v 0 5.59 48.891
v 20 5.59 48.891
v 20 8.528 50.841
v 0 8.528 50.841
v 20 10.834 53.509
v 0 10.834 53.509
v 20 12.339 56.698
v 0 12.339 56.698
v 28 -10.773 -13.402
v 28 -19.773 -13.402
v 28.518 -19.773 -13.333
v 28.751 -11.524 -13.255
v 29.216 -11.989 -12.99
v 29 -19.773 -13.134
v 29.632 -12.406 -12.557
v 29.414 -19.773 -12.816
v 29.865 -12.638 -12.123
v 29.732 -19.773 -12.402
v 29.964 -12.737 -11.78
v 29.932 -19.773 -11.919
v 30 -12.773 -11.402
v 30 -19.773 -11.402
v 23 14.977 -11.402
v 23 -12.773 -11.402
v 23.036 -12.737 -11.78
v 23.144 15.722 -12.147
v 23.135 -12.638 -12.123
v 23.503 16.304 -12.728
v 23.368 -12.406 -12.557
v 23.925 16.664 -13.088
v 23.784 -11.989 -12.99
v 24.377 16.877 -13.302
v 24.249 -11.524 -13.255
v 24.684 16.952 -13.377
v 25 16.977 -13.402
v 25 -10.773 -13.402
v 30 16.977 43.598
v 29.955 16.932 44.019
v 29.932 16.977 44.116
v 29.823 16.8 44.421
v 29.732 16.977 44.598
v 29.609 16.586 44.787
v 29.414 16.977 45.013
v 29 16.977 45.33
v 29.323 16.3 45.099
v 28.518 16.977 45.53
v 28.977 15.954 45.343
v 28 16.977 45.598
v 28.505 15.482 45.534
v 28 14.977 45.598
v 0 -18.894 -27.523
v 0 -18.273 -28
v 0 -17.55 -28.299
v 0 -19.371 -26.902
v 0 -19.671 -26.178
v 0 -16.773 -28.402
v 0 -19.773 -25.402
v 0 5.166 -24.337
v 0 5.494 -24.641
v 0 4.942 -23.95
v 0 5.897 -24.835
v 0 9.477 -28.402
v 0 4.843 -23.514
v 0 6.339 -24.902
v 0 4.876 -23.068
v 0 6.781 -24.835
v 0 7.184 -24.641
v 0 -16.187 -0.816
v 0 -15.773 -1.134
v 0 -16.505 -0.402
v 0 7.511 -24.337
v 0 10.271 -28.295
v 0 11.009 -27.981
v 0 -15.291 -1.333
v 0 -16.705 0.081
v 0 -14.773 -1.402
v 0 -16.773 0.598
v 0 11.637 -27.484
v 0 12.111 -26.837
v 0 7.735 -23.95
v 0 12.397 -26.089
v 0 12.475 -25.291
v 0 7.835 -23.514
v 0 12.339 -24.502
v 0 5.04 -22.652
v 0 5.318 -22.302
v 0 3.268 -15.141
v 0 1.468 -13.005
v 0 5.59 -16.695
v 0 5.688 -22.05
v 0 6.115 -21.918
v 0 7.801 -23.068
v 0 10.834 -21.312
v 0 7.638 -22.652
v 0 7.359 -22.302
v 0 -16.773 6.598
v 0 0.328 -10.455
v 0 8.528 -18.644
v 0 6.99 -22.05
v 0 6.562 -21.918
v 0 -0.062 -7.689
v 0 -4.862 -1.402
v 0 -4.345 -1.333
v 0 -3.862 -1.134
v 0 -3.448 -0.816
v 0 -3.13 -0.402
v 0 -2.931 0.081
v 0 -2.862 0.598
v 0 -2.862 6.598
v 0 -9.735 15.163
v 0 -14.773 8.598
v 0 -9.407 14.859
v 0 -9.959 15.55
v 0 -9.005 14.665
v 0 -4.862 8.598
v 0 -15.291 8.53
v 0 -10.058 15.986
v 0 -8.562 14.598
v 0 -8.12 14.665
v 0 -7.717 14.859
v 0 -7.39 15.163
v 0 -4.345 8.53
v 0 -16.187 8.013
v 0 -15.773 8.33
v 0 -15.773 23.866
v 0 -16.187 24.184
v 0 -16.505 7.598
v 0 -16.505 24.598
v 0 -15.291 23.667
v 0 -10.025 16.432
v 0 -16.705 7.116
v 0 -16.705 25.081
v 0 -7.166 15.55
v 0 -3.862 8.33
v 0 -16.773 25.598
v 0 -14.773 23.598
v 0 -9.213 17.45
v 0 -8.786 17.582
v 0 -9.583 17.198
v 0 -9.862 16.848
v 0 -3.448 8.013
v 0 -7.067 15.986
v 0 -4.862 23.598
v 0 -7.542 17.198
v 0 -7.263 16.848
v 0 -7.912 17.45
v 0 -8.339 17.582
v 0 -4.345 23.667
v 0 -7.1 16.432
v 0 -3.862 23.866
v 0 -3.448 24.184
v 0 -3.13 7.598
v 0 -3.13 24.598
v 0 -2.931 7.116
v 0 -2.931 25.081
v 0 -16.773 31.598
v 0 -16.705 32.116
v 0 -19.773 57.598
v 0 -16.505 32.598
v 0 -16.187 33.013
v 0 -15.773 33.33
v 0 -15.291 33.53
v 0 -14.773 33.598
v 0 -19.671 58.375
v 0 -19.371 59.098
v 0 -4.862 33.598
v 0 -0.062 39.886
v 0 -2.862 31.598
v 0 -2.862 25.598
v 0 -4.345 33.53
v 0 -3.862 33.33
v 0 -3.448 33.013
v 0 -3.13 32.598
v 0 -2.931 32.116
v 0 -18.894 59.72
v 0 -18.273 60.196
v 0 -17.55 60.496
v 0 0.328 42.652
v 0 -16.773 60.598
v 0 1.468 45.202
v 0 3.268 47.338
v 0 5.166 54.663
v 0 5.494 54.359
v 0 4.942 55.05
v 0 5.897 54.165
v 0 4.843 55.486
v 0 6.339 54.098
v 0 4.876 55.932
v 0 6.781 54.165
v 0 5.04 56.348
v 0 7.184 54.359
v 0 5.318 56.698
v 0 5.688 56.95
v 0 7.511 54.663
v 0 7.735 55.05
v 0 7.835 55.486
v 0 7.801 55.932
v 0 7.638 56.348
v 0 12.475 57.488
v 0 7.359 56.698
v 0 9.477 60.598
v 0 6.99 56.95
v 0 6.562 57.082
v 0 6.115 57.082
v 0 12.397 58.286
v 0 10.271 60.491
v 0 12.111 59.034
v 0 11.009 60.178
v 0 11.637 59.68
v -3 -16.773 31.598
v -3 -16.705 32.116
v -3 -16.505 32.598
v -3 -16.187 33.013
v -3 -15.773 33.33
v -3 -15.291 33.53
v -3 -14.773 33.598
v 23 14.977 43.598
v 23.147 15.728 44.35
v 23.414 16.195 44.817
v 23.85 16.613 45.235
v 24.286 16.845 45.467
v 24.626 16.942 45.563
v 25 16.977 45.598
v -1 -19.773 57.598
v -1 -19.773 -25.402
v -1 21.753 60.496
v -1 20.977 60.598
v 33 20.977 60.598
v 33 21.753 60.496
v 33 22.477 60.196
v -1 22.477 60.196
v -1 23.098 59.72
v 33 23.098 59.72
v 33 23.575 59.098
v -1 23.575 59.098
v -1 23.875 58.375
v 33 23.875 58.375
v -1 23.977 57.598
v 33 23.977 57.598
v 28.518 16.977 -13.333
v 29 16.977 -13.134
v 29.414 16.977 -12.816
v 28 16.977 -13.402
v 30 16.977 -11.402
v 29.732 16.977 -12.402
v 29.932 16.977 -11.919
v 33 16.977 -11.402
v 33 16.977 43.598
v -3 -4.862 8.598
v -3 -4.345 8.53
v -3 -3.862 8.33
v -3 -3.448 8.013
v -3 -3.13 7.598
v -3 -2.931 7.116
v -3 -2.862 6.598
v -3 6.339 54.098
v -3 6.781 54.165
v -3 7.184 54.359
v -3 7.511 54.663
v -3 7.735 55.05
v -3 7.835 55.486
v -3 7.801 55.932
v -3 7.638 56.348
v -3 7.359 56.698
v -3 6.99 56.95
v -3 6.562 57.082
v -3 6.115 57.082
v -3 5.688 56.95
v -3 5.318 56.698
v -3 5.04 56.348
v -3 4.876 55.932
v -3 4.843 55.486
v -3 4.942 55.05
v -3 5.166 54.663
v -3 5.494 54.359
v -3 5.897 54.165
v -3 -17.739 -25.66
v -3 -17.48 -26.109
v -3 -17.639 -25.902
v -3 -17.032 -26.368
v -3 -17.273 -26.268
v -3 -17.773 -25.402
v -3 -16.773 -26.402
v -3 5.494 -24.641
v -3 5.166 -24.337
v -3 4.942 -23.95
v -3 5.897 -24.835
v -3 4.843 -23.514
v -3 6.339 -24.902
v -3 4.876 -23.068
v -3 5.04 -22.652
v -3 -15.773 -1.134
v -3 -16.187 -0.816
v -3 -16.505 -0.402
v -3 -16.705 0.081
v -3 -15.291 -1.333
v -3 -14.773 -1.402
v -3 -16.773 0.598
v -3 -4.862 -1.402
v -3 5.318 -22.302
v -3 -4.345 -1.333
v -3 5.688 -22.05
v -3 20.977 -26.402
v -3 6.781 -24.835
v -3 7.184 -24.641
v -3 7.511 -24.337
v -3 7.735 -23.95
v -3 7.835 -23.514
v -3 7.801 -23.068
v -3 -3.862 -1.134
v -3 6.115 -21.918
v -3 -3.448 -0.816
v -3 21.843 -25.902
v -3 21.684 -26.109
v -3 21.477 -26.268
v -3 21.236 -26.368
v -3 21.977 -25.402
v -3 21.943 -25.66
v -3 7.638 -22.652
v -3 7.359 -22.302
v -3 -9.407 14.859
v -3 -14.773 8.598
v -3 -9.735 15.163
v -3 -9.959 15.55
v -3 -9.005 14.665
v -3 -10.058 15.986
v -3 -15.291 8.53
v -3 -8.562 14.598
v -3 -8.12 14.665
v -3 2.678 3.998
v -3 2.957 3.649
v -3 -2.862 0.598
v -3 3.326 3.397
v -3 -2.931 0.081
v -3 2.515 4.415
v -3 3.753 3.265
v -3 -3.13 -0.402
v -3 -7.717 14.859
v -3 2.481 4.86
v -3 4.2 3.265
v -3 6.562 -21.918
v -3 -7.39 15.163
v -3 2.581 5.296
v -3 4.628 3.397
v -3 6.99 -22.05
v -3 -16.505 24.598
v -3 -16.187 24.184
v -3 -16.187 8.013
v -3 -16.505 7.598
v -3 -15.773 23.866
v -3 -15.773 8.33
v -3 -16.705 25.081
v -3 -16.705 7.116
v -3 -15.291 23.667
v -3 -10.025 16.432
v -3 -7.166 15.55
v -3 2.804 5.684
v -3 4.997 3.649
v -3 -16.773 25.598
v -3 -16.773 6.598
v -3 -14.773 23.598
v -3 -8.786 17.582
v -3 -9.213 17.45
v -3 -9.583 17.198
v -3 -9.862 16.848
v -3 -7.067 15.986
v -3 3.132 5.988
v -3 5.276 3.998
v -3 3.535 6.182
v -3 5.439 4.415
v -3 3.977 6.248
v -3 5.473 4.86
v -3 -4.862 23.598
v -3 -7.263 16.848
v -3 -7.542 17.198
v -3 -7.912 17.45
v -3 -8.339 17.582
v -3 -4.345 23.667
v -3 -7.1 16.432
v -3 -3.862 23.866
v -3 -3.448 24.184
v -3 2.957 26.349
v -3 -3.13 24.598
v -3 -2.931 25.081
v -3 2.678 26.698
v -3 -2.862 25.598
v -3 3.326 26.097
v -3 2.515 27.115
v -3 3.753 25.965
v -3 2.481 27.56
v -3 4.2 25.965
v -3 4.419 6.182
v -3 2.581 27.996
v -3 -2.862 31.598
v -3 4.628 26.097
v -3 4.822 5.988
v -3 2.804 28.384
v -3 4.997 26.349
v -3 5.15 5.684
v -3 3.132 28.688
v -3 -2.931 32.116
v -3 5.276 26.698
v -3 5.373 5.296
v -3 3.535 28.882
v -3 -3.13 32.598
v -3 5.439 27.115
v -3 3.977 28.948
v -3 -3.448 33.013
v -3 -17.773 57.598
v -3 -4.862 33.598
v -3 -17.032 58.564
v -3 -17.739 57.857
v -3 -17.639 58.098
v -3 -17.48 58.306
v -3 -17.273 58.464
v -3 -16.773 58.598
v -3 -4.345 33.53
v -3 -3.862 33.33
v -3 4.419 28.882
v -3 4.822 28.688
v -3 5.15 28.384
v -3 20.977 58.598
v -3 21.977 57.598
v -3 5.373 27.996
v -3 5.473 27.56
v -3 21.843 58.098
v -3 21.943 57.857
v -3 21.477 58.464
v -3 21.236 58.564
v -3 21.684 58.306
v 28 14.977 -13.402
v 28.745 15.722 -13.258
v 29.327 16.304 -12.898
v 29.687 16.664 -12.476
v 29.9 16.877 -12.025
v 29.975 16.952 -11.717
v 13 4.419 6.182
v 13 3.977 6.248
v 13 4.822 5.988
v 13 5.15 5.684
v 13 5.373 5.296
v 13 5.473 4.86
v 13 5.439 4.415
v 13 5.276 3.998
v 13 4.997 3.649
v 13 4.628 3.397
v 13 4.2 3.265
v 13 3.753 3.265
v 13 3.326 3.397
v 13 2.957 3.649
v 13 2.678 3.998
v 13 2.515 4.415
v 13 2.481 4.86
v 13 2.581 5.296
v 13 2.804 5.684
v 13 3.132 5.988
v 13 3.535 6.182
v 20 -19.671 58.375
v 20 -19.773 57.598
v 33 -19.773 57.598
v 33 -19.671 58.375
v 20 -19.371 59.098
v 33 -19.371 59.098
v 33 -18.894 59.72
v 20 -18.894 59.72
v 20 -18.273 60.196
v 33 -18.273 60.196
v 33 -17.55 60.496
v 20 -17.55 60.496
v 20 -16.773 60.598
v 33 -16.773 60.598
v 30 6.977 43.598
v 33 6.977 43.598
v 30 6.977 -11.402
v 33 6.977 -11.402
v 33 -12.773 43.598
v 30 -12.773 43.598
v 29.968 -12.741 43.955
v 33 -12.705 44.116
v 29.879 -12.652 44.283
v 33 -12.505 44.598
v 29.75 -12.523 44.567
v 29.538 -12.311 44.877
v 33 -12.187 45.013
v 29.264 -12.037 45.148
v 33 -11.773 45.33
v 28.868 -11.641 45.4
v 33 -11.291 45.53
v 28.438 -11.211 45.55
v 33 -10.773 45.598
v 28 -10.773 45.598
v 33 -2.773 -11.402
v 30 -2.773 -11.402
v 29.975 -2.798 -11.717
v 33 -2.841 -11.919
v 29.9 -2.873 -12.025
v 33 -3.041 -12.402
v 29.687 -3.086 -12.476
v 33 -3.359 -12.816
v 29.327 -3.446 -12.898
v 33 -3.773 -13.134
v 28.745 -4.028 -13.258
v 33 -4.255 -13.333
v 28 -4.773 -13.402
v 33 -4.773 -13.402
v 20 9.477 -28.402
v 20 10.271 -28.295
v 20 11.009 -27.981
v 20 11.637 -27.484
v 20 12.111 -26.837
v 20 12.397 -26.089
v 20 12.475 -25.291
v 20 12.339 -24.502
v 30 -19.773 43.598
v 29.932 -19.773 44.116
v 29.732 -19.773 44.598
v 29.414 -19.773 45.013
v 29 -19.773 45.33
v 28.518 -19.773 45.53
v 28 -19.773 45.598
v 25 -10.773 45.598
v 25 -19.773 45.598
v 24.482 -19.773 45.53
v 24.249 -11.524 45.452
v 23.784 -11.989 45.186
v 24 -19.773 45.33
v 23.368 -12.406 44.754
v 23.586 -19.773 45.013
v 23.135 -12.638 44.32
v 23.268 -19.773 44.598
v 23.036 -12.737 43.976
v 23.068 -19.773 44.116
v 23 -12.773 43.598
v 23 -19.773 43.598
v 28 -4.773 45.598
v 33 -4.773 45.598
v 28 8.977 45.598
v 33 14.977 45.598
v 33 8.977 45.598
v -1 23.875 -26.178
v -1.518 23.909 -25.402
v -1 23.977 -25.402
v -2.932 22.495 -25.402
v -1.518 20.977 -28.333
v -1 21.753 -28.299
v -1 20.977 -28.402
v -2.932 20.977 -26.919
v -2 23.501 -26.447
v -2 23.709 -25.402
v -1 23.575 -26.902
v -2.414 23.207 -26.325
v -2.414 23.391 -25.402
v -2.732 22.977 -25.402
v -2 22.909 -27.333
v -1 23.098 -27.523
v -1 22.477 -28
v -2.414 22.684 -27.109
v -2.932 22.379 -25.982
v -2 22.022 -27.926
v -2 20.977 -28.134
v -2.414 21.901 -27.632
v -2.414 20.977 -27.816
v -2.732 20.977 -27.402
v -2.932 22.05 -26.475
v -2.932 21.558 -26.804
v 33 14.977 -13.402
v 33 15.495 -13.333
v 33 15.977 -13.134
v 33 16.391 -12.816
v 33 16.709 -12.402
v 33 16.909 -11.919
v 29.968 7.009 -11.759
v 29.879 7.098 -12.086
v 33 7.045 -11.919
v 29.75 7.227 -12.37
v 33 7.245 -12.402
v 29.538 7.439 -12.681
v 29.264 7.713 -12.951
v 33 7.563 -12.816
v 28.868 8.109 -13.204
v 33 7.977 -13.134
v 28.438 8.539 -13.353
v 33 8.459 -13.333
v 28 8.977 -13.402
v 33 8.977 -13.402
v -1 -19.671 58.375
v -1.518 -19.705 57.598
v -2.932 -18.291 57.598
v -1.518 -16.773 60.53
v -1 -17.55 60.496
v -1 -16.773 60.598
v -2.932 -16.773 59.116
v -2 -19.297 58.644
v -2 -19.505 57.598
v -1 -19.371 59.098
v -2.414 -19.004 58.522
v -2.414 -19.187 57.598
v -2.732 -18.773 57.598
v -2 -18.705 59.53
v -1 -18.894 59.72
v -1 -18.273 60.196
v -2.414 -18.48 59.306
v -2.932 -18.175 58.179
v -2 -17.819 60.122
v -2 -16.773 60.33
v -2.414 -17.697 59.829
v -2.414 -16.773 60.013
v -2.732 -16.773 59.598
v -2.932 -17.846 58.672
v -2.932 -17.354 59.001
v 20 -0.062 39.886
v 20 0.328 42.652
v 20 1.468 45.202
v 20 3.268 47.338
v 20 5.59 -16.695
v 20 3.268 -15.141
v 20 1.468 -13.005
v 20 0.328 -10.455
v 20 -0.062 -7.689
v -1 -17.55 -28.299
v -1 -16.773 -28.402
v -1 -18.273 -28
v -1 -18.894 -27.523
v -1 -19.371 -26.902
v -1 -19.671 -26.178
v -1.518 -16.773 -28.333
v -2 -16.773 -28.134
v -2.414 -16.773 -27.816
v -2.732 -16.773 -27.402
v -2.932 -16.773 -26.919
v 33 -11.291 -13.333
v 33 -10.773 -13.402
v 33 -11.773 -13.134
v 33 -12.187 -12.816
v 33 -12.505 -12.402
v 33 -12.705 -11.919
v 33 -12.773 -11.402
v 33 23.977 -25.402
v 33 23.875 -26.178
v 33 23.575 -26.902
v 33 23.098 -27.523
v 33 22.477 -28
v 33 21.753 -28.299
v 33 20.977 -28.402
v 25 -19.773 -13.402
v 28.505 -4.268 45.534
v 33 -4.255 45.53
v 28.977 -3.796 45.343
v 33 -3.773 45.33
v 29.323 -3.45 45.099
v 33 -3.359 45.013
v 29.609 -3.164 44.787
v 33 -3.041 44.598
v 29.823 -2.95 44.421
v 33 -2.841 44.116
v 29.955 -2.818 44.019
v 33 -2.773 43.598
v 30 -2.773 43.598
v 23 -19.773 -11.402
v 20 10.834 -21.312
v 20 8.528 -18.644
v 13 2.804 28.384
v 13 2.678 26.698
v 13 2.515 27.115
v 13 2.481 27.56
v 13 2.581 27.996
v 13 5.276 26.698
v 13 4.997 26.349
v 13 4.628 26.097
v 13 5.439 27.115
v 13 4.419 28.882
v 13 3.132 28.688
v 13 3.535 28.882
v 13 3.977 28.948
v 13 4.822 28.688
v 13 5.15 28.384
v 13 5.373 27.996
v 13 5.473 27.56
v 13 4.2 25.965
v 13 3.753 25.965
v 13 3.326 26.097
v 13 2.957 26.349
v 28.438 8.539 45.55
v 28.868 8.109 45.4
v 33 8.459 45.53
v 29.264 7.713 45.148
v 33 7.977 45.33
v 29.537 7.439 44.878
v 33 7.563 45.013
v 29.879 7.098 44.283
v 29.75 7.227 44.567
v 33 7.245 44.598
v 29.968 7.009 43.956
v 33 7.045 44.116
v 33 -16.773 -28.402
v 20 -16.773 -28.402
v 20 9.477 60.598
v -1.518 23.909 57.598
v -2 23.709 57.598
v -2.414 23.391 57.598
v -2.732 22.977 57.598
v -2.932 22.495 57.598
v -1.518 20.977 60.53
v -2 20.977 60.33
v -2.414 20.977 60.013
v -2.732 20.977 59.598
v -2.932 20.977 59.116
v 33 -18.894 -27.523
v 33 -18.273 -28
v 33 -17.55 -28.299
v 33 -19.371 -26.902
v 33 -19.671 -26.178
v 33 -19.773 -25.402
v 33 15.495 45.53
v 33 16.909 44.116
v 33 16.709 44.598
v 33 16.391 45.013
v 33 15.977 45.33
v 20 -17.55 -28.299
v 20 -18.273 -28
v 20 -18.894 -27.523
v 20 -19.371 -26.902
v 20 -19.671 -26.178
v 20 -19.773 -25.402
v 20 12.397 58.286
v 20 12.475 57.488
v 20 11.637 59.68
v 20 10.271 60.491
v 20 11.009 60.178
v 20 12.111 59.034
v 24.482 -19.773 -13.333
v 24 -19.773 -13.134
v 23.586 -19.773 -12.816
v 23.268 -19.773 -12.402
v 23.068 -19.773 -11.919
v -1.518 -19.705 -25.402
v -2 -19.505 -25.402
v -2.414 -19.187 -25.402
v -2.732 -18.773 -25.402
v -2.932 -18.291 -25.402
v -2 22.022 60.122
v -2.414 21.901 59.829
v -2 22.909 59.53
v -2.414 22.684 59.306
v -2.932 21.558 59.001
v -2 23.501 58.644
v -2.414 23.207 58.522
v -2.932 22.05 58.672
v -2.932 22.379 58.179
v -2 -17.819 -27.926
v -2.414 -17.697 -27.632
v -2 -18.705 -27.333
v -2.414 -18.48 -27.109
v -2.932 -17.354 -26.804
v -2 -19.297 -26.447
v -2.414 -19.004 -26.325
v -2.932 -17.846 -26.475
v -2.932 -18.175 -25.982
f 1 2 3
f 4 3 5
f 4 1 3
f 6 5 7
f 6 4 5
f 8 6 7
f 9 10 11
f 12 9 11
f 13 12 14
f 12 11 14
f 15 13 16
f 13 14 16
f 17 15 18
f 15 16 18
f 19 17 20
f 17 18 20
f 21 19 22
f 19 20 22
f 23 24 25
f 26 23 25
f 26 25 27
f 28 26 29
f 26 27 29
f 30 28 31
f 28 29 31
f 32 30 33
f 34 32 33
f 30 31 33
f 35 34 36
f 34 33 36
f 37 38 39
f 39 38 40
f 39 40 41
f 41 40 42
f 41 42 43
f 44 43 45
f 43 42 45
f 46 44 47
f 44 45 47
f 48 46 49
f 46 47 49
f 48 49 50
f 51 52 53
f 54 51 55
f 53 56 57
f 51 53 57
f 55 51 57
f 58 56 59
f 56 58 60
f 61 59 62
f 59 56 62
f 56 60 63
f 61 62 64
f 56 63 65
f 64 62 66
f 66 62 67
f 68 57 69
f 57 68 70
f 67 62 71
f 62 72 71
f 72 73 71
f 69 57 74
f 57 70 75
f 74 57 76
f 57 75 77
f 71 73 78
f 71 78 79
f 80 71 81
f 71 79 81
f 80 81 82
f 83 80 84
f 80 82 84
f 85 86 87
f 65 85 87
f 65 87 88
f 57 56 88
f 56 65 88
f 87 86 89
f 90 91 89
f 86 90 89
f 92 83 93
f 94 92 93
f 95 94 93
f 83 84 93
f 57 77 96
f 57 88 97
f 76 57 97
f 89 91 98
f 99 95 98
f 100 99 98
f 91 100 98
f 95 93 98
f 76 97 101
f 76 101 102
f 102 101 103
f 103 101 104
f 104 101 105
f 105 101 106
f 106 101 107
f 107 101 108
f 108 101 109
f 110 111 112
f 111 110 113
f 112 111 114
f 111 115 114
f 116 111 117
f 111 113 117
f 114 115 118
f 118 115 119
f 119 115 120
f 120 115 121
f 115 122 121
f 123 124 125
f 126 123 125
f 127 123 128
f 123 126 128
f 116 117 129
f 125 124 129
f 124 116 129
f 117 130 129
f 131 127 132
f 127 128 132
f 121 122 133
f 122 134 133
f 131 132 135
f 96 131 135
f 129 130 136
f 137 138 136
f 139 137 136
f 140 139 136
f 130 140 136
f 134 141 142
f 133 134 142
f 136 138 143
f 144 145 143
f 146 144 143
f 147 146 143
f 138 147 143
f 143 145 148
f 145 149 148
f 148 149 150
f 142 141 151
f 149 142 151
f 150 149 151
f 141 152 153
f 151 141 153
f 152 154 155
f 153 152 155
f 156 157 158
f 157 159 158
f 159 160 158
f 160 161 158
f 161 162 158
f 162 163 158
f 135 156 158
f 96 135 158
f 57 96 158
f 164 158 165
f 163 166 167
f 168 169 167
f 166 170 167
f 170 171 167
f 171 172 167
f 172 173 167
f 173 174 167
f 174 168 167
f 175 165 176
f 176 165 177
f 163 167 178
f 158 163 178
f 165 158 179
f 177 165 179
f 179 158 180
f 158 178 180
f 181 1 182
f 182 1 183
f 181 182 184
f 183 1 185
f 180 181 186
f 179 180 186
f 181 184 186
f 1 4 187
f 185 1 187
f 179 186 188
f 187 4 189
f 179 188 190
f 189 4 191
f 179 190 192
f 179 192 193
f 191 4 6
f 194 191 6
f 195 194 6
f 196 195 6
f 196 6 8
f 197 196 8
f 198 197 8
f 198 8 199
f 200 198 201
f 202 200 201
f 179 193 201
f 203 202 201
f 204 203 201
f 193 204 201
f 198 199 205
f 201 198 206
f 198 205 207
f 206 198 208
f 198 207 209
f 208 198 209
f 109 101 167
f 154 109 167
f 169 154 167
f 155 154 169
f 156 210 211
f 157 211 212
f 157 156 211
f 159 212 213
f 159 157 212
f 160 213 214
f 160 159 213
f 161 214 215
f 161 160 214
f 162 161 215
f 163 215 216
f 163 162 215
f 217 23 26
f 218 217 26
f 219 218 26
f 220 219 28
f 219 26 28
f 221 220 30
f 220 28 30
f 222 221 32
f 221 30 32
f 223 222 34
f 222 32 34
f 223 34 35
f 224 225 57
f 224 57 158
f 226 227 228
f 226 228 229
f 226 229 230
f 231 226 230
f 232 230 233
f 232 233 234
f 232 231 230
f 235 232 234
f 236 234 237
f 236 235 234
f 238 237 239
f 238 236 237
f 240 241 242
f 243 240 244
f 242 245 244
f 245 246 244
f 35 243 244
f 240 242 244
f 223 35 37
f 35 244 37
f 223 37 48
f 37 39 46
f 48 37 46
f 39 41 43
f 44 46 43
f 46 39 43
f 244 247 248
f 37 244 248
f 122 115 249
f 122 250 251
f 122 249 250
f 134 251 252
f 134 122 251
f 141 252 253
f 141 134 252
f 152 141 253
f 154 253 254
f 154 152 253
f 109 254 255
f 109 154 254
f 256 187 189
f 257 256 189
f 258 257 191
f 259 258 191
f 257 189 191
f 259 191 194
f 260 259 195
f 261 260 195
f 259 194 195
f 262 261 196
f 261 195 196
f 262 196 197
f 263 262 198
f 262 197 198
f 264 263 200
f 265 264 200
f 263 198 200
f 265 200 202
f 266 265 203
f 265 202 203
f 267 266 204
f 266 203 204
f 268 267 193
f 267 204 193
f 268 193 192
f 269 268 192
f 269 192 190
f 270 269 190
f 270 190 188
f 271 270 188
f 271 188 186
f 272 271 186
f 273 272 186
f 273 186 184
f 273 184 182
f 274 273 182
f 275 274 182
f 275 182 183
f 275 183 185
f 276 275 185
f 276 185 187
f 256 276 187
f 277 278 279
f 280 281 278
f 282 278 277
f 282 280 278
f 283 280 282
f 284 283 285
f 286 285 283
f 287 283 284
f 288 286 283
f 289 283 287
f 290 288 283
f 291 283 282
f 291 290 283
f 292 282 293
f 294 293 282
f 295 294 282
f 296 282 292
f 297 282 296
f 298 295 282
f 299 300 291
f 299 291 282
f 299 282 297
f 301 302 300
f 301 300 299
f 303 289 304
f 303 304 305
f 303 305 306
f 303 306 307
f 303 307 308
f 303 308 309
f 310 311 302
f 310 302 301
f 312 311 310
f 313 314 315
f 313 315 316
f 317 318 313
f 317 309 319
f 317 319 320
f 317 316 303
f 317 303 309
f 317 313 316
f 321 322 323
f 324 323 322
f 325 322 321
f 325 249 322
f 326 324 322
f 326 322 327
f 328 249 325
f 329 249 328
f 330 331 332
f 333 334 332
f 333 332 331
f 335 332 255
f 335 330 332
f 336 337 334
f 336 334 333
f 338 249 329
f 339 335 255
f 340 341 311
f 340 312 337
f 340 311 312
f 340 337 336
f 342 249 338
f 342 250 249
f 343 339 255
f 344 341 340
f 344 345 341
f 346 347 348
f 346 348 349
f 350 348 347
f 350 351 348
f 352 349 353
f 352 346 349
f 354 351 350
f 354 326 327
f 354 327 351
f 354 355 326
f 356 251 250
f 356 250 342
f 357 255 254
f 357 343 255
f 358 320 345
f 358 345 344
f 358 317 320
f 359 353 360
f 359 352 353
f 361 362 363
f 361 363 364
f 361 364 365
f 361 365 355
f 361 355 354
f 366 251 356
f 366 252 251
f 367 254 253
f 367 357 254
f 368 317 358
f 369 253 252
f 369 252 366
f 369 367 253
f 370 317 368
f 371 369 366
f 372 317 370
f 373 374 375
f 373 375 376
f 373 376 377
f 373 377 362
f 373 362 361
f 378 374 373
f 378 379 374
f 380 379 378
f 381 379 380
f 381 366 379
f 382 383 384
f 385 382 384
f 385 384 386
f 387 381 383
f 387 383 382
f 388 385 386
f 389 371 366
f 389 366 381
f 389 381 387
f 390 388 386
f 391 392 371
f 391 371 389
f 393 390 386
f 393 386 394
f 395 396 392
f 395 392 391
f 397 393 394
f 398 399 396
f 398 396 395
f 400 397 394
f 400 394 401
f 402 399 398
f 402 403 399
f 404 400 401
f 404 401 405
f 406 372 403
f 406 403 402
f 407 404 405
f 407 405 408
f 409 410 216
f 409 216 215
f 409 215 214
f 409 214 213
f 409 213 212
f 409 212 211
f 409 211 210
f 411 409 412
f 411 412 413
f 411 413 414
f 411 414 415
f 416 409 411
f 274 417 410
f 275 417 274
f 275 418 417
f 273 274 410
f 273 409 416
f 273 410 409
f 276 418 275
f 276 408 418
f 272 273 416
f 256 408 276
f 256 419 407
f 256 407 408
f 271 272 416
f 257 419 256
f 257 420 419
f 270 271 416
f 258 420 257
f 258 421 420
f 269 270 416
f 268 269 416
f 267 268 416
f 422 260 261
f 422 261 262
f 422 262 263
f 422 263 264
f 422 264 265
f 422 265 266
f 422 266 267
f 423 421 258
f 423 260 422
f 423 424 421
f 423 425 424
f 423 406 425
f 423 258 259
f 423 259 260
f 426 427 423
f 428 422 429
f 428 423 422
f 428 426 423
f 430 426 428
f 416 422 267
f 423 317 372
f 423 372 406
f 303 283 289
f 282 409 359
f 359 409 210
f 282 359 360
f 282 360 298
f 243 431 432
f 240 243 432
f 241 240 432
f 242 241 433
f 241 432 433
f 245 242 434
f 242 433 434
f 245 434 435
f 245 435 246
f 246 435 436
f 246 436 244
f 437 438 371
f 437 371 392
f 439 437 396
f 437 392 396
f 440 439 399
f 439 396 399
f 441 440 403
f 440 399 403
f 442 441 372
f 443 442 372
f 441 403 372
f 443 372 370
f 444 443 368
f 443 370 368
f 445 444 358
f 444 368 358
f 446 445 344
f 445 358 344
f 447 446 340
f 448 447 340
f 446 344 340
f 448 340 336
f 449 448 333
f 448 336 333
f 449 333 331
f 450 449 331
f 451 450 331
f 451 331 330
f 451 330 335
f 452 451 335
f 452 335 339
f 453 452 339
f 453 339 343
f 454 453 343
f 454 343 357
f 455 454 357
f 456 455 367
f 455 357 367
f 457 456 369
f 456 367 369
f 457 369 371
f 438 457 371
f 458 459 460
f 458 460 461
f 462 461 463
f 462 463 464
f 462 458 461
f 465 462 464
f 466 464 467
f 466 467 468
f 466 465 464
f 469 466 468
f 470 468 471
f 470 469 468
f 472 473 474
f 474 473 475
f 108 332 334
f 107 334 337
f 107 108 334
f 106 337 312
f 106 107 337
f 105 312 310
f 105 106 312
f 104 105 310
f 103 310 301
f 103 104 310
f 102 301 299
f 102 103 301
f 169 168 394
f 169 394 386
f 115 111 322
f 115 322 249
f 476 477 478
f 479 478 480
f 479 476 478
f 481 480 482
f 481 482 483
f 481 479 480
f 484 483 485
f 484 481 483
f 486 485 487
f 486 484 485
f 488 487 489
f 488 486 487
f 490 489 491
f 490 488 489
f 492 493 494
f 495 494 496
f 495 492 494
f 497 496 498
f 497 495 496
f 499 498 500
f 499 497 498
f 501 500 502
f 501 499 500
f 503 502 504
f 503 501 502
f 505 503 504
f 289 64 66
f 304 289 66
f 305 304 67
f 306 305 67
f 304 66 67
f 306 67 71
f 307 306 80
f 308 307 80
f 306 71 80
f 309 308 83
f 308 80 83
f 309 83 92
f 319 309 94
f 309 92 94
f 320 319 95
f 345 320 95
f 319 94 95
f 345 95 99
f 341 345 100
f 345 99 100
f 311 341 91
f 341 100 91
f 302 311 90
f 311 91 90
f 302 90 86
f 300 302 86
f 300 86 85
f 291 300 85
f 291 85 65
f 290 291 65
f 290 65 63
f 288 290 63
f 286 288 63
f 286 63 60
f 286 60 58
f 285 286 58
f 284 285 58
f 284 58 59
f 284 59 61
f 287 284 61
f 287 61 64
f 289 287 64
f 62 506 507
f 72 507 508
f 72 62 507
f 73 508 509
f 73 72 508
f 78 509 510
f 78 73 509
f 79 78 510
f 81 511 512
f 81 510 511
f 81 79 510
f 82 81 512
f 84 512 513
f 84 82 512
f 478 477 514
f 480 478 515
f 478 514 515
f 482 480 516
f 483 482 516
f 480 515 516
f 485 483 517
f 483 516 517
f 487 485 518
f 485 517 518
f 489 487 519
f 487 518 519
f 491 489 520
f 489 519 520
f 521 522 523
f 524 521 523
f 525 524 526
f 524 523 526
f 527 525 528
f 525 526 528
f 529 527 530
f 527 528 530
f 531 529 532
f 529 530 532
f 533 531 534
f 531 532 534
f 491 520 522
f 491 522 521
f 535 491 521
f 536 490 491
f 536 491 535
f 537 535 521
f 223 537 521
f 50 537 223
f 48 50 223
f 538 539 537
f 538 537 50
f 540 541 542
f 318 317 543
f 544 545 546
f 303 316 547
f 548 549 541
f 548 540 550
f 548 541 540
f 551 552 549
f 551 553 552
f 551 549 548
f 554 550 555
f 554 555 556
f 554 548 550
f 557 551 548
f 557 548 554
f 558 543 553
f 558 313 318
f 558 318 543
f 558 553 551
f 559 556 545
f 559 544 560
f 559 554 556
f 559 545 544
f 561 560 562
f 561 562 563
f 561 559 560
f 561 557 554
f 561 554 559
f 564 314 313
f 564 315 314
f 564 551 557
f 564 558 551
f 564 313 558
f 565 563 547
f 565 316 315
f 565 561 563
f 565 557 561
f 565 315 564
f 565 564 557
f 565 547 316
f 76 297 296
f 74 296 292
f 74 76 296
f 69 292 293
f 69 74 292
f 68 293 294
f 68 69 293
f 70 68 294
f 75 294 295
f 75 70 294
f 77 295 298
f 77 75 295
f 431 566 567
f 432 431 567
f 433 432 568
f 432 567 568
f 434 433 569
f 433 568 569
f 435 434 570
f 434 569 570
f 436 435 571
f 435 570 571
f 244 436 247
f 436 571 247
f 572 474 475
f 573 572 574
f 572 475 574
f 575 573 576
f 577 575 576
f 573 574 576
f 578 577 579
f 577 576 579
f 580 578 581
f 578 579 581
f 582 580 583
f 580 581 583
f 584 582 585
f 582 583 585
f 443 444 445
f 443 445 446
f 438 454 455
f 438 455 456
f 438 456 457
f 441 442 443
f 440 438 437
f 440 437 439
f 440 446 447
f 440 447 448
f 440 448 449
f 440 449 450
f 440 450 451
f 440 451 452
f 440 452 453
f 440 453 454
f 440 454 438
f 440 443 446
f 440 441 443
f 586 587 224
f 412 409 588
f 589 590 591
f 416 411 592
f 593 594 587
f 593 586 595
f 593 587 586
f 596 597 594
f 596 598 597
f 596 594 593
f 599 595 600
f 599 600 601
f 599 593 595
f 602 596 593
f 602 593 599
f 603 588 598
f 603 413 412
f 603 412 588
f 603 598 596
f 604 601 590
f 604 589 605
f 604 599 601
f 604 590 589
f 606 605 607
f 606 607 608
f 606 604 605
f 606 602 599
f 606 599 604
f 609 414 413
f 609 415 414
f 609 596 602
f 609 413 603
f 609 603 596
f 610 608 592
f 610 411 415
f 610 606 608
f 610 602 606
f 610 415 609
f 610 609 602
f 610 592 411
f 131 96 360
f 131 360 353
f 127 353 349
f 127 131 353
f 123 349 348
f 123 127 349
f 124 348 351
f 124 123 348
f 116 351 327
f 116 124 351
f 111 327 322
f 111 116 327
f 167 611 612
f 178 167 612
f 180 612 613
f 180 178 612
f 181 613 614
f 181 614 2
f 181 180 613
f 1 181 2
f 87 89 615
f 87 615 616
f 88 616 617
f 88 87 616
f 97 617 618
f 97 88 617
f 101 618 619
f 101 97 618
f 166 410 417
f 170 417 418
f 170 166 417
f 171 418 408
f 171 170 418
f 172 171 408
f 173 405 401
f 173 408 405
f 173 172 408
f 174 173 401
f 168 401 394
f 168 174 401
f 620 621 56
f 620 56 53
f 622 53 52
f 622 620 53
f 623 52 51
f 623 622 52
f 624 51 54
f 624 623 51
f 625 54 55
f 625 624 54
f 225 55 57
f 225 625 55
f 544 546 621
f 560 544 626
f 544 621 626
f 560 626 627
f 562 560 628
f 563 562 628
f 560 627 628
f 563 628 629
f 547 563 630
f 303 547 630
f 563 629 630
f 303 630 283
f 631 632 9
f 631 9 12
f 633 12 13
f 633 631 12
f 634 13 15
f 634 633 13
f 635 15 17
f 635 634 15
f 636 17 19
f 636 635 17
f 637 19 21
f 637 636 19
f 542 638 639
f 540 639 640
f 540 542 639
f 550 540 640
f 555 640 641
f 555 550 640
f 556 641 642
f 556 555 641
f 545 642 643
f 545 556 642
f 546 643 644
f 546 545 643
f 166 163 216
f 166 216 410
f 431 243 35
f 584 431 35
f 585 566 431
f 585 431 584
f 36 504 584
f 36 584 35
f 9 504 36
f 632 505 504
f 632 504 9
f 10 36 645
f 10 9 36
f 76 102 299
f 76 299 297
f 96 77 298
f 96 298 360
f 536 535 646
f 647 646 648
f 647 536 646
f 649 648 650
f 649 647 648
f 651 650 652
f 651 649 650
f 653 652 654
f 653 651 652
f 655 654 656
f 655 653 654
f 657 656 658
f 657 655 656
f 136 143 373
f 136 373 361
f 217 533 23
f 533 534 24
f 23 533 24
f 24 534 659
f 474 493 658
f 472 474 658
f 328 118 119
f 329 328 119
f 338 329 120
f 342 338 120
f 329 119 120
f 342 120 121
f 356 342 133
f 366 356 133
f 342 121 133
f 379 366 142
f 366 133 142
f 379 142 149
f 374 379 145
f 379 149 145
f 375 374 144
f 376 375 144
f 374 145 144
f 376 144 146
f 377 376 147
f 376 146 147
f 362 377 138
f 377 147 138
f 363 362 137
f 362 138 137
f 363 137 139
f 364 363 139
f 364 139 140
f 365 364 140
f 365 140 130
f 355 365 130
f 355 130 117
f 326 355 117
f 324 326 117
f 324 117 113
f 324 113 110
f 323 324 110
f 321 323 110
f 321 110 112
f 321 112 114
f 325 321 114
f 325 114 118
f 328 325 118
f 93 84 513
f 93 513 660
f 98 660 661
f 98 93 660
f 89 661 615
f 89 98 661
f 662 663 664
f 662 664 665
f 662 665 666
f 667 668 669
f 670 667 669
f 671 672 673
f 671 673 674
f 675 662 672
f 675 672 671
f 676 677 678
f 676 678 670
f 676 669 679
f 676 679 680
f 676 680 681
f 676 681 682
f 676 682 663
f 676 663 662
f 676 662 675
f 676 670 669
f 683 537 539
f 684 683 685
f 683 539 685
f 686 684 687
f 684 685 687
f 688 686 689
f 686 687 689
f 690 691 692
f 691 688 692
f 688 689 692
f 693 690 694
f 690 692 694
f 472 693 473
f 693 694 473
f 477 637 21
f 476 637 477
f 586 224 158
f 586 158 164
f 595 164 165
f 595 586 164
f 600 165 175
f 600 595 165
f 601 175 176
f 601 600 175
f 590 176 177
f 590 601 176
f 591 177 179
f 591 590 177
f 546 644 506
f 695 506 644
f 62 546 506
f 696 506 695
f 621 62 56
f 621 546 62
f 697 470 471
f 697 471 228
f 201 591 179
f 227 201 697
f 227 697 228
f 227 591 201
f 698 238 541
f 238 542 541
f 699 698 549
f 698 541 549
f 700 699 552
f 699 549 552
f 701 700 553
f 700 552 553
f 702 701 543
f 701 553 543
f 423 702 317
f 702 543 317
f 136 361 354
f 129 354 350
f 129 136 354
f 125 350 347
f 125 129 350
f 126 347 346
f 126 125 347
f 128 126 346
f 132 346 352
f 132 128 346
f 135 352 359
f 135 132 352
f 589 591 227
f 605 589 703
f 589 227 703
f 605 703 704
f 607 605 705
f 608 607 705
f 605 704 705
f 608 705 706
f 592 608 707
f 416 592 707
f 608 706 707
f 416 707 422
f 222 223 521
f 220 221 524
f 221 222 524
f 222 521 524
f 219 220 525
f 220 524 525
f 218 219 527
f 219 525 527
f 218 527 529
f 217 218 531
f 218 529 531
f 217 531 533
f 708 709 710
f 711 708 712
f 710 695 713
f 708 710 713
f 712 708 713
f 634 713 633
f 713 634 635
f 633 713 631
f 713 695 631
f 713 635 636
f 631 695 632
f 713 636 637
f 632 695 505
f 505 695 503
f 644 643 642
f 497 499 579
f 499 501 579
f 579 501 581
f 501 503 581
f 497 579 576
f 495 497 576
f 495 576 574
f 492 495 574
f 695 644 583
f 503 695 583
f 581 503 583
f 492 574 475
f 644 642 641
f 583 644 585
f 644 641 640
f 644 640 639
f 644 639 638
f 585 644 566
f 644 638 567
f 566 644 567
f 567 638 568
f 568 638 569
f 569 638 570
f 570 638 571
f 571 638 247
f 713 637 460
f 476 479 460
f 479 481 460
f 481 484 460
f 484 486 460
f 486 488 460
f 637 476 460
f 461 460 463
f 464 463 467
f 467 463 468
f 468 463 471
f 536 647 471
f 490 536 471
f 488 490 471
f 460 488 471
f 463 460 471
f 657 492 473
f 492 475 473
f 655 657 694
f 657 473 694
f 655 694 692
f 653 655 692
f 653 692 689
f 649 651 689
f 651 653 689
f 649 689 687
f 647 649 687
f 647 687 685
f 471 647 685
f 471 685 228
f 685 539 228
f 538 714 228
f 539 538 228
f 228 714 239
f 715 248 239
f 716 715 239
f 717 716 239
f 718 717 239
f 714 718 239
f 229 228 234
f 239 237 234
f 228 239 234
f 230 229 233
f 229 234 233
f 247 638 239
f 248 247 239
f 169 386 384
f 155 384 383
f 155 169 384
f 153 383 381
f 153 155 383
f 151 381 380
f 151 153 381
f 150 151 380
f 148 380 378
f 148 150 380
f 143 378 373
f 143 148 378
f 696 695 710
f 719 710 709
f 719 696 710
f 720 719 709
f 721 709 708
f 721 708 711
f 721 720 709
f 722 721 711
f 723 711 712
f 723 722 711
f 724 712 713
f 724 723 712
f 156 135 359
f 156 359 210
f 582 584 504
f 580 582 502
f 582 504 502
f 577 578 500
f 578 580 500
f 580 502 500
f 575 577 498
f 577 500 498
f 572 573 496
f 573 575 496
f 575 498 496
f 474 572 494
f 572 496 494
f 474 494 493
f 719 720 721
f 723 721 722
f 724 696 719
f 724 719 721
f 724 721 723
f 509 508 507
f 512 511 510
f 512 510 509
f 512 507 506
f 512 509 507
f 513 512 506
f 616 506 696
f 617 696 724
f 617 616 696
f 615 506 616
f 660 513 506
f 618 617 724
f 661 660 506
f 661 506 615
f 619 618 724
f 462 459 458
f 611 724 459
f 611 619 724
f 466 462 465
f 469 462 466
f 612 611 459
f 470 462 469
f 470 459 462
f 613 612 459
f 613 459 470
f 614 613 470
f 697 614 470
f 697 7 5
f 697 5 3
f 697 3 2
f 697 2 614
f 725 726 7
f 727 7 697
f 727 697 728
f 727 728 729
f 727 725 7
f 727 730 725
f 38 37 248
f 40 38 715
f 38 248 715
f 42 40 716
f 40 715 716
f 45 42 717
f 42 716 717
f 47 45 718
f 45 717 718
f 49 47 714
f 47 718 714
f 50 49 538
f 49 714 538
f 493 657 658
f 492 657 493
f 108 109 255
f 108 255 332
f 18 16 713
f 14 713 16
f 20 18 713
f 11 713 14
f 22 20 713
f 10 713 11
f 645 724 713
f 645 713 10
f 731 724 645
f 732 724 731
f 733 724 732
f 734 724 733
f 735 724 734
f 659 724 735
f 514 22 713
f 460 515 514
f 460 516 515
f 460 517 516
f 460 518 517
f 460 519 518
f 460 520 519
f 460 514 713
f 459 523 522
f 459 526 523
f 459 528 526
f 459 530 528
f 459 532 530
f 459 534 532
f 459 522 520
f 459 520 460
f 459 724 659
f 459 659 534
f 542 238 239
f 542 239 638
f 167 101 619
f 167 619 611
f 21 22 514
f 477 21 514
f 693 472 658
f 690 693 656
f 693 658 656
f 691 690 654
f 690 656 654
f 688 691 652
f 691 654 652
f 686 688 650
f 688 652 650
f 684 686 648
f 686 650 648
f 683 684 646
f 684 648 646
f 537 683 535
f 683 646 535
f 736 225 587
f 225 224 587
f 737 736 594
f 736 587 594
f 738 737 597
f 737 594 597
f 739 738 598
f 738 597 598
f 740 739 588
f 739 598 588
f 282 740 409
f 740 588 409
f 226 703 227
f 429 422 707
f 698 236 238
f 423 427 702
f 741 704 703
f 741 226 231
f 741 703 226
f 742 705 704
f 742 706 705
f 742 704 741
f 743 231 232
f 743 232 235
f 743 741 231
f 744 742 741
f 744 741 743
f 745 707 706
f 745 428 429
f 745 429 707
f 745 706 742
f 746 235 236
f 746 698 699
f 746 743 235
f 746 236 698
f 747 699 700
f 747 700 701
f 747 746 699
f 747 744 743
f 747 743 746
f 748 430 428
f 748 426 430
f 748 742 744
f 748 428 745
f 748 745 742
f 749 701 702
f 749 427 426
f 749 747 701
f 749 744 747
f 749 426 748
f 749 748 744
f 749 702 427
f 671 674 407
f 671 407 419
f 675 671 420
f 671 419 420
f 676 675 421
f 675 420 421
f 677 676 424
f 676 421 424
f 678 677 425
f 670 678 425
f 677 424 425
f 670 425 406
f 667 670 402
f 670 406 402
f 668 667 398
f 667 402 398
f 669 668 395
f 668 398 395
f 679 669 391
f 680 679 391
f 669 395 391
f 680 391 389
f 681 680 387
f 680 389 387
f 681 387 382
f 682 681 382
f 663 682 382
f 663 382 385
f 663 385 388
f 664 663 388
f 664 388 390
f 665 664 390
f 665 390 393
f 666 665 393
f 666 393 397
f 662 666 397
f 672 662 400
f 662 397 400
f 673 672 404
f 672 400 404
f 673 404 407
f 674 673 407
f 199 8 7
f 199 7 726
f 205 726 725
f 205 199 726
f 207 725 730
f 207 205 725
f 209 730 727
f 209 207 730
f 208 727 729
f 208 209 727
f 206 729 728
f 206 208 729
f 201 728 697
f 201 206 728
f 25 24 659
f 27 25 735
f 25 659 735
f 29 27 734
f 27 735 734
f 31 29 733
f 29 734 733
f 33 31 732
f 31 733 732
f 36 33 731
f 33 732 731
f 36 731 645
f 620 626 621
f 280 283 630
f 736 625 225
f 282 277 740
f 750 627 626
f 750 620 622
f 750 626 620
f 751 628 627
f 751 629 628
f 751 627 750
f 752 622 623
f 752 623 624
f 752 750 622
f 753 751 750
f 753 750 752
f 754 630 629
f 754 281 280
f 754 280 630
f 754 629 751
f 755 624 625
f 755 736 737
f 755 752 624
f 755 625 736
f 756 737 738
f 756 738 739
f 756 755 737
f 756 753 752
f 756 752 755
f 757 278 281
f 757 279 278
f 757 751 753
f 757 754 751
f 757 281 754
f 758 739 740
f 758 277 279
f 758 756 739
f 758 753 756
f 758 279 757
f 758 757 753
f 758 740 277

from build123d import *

# Parameters (mm, degrees)
RESSALTO_EXTRUS_O2_DEPTH      = 30
RESSALTO_EXTRUS_O3_START      = 3
RESSALTO_EXTRUS_O3_DEPTH      = 3
RESSALTO_EXTRUS_O4_DEPTH      = 3
RESSALTO_EXTRUS_O4_DEPTH_BACK = 10
CORTE_EXTRUS_O1_DEPTH         = 10
CORTE_EXTRUS_O2_REACH         = 83.702
FILETE1_START                 = -19.773073923
FILETE1_DEPTH                 = 36.75
FILETE1_START_2               = -13.40159992
FILETE1_2_DEPTH               = 59
ESBO_O10_R                    = 1.5
CORTE_EXTRUS_O3_DEPTH         = 10
CORTE_EXTRUS_O4_DEPTH         = 10
FILETE2_R                     = 2
ESBO_O13_R                    = 1.5
CORTE_EXTRUS_O5_DEPTH         = 16


with BuildPart() as part:
    # Esboço2 → Ressalto-extrusão2 (new body)
    with BuildSketch(Plane(origin=(0, 0, 0), x_dir=(0, 0, -1), z_dir=(1, 0, 0))):
        with BuildLine():
            Line((2.90159992, -0.062465938), (-35.09840008, -0.062465938))
            Line((-35.09840008, -0.062465938), (-39.886084903, -0.062465938))
            ThreePointArc((-39.886084903, -0.062465938), (-45.202180234, 1.467638524), (-48.891439328, 5.589707975))
            ThreePointArc((-48.891439328, 5.589707975), (-52.096536948, 9.772081499), (-56.69840008, 12.338743681))
            ThreePointArc((-56.69840008, 12.338743681), (-59.373224015, 11.895603401), (-60.59840008, 9.476926077))
            Line((-60.59840008, 9.476926077), (-60.59840008, 20.976926077))
            ThreePointArc((-60.59840008, 20.976926077), (-59.719720424, 23.09824642), (-57.59840008, 23.976926077))
            Line((-57.59840008, 23.976926077), (25.40159992, 23.976926077))
            ThreePointArc((25.40159992, 23.976926077), (27.522920263, 23.09824642), (28.40159992, 20.976926077))
            Line((28.40159992, 20.976926077), (28.40159992, 9.476926077))
            ThreePointArc((28.40159992, 9.476926077), (27.176423855, 11.895603401), (24.50159992, 12.338743681))
            ThreePointArc((24.50159992, 12.338743681), (19.899736788, 9.772081499), (16.694639168, 5.589707975))
            ThreePointArc((16.694639168, 5.589707975), (13.005380073, 1.467638524), (7.689284743, -0.062465938))
            Line((7.689284743, -0.062465938), (2.90159992, -0.062465938))
        make_face()
    extrude(amount=RESSALTO_EXTRUS_O2_DEPTH)

    # Esboço3 → Ressalto-extrusão3 (add)
    with BuildSketch(Plane.ZY.offset(RESSALTO_EXTRUS_O3_START)):
        with BuildLine():
            Line((60.59840008, 15.226926077), (60.59840008, 20.976926077))
            ThreePointArc((60.59840008, 20.976926077), (59.719720424, 23.09824642), (57.59840008, 23.976926077))
            Line((57.59840008, 23.976926077), (16.09840008, 23.976926077))
            Line((16.09840008, 23.976926077), (-25.40159992, 23.976926077))
            ThreePointArc((-25.40159992, 23.976926077), (-27.522920263, 23.09824642), (-28.40159992, 20.976926077))
            Line((-28.40159992, 20.976926077), (-28.40159992, 15.226926077))
            Line((-28.40159992, 15.226926077), (-28.40159992, -16.773073923))
            ThreePointArc((-28.40159992, -16.773073923), (-27.522920263, -18.894394267), (-25.40159992, -19.773073923))
            Line((-25.40159992, -19.773073923), (57.59840008, -19.773073923))
            ThreePointArc((57.59840008, -19.773073923), (59.719720424, -18.894394267), (60.59840008, -16.773073923))
            Line((60.59840008, -16.773073923), (60.59840008, 15.226926077))
        make_face()
    extrude(amount=-RESSALTO_EXTRUS_O3_DEPTH)

    # Esboço4 → Ressalto-extrusão4 (add, two sides: drawn at the far end of the back side and taken through both)
    with BuildSketch(Plane(origin=(30, 0, 0), x_dir=(0, 0, -1), z_dir=(1, 0, 0)).offset(-RESSALTO_EXTRUS_O4_DEPTH_BACK)):
        with BuildLine():
            Line((-16.09840008, 23.976926077), (25.40159992, 23.976926077))
            ThreePointArc((25.40159992, 23.976926077), (27.522920263, 23.09824642), (28.40159992, 20.976926077))
            Line((28.40159992, 20.976926077), (28.40159992, 15.226926077))
            Line((28.40159992, 15.226926077), (28.40159992, -16.773073923))
            ThreePointArc((28.40159992, -16.773073923), (27.522920263, -18.894394267), (25.40159992, -19.773073923))
            Line((25.40159992, -19.773073923), (-57.59840008, -19.773073923))
            ThreePointArc((-57.59840008, -19.773073923), (-59.719720424, -18.894394267), (-60.59840008, -16.773073923))
            Line((-60.59840008, -16.773073923), (-60.59840008, 15.226926077))
            Line((-60.59840008, 15.226926077), (-60.59840008, 20.976926077))
            ThreePointArc((-60.59840008, 20.976926077), (-59.719720424, 23.09824642), (-57.59840008, 23.976926077))
            Line((-57.59840008, 23.976926077), (-16.09840008, 23.976926077))
        make_face()
    extrude(amount=RESSALTO_EXTRUS_O4_DEPTH + RESSALTO_EXTRUS_O4_DEPTH_BACK)

    # Esboço8 → Corte-extrusão1 (cut)
    with BuildSketch(Plane(origin=(33, 0, 0), x_dir=(0, 0, -1), z_dir=(1, 0, 0))):
        with BuildLine():
            Line((-43.59840008, -2.773073923), (11.40159992, -2.773073923))
            ThreePointArc((11.40159992, -2.773073923), (12.815813482, -3.358860361), (13.40159992, -4.773073923))
            Line((13.40159992, -4.773073923), (13.40159992, -10.773073923))
            ThreePointArc((13.40159992, -10.773073923), (12.815813482, -12.187287486), (11.40159992, -12.773073923))
            Line((11.40159992, -12.773073923), (-43.59840008, -12.773073923))
            ThreePointArc((-43.59840008, -12.773073923), (-45.012613643, -12.187287486), (-45.59840008, -10.773073923))
            Line((-45.59840008, -10.773073923), (-45.59840008, -4.773073923))
            ThreePointArc((-45.59840008, -4.773073923), (-45.012613643, -3.358860361), (-43.59840008, -2.773073923))
        make_face()
        with BuildLine():
            Line((-43.59840008, 6.976926077), (11.40159992, 6.976926077))
            ThreePointArc((11.40159992, 6.976926077), (12.815813482, 7.562712514), (13.40159992, 8.976926077))
            Line((13.40159992, 8.976926077), (13.40159992, 14.976926077))
            ThreePointArc((13.40159992, 14.976926077), (12.815813482, 16.391139639), (11.40159992, 16.976926077))
            Line((11.40159992, 16.976926077), (-43.59840008, 16.976926077))
            ThreePointArc((-43.59840008, 16.976926077), (-45.012613643, 16.391139639), (-45.59840008, 14.976926077))
            Line((-45.59840008, 14.976926077), (-45.59840008, 8.976926077))
            ThreePointArc((-45.59840008, 8.976926077), (-45.012613643, 7.562712514), (-43.59840008, 6.976926077))
        make_face()
    extrude(amount=-CORTE_EXTRUS_O1_DEPTH, mode=Mode.SUBTRACT)

    # Corte-extrusão2: up to this face of the body (flat: up to its plane)
    corte_extrus_o2_end = Plane(part.part.faces().sort_by_distance((28, 16.976926077, 16.09840008))[0])
    # Esboço9 → Corte-extrusão2 (cut, up to the picked face)
    with BuildSketch(Plane(origin=(0, -19.773073923, 0), x_dir=(-1, 0, 0), z_dir=(0, -1, 0)), mode=Mode.PRIVATE) as corte_extrus_o2_sk1:
        with BuildLine():
            Line((-25, 13.40159992), (-28, 13.40159992))
            ThreePointArc((-28, 13.40159992), (-29.414213562, 12.815813482), (-30, 11.40159992))
            Line((-30, 11.40159992), (-30, -43.59840008))
            ThreePointArc((-30, -43.59840008), (-29.414213562, -45.012613643), (-28, -45.59840008))
            Line((-28, -45.59840008), (-25, -45.59840008))
            ThreePointArc((-25, -45.59840008), (-23.585786438, -45.012613643), (-23, -43.59840008))
            Line((-23, -43.59840008), (-23, 11.40159992))
            ThreePointArc((-23, 11.40159992), (-23.585786438, 12.815813482), (-25, 13.40159992))
        make_face()
    corte_extrus_o2_tool1 = split(extrude(corte_extrus_o2_sk1.sketch, amount=-CORTE_EXTRUS_O2_REACH, mode=Mode.PRIVATE), bisect_by=corte_extrus_o2_end, keep=Keep.BOTH, mode=Mode.PRIVATE)
    add(corte_extrus_o2_tool1.solids().sort_by(Axis((26.5, -19.773074, 16.0984), (0, 1, 0)))[0], mode=Mode.SUBTRACT)

    # Filete1: read off the stored shape, not the designer's step
    # Filete1 outline → Filete1 (add)
    with BuildSketch(Plane(origin=(0, 0, 0), x_dir=(1, 0, 0), z_dir=(0, 1, 0)).offset(FILETE1_START)):
        with BuildLine():
            ThreePointArc((25, -45.59840008), (23.585786437, -45.012613642), (23, -43.59840008))
            Line((23, -43.59840008), (23, -45.59840008))
            Line((23, -45.59840008), (25, -45.59840008))
        make_face()
        with BuildLine():
            ThreePointArc((23, 11.40159992), (23.585786438, 12.815813482), (25, 13.40159992))
            Line((25, 13.40159992), (23, 13.40159992))
            Line((23, 13.40159992), (23, 11.40159992))
        make_face()
    extrude(amount=FILETE1_DEPTH)

    # Filete1 2 outline → Filete1 2 (add)
    with BuildSketch(Plane.XY.offset(FILETE1_START_2)):
        with BuildLine():
            ThreePointArc((23, 14.976926077), (23.585786438, 16.391139639), (25, 16.976926077))
            Line((25, 16.976926077), (23, 16.976926077))
            Line((23, 16.976926077), (23, 14.976926077))
        make_face()
    extrude(amount=FILETE1_2_DEPTH)

    # Esboço10 → Corte-extrusão3 (cut)
    with BuildSketch(Plane(origin=(0, 0, 0), x_dir=(0, 0, -1), z_dir=(1, 0, 0))):
        with Locations((-55.59840008, 6.338743681)):
            Circle(ESBO_O10_R)
        with Locations((23.40159992, 6.338743681)):
            Circle(ESBO_O10_R)
        with Locations((-16.09840008, -8.562465938)):
            Circle(ESBO_O10_R)
    extrude(amount=-CORTE_EXTRUS_O3_DEPTH, mode=Mode.SUBTRACT)

    # Esboço12 → Corte-extrusão4 (cut)
    with BuildSketch(Plane(origin=(0, 0, 0), x_dir=(0, 0, -1), z_dir=(1, 0, 0))):
        with BuildLine():
            Line((-31.59840008, -2.862465938), (-25.59840008, -2.862465938))
            ThreePointArc((-25.59840008, -2.862465938), (-24.184186518, -3.448252375), (-23.59840008, -4.862465938))
            Line((-23.59840008, -4.862465938), (-23.59840008, -14.773073923))
            ThreePointArc((-23.59840008, -14.773073923), (-24.184186518, -16.187287486), (-25.59840008, -16.773073923))
            Line((-25.59840008, -16.773073923), (-31.59840008, -16.773073923))
            ThreePointArc((-31.59840008, -16.773073923), (-33.012613643, -16.187287486), (-33.59840008, -14.773073923))
            Line((-33.59840008, -14.773073923), (-33.59840008, -4.862465938))
            ThreePointArc((-33.59840008, -4.862465938), (-33.012613643, -3.448252375), (-31.59840008, -2.862465938))
        make_face()
        with BuildLine():
            Line((-6.59840008, -2.862465938), (-0.59840008, -2.862465938))
            ThreePointArc((-0.59840008, -2.862465938), (0.815813482, -3.448252375), (1.40159992, -4.862465938))
            Line((1.40159992, -4.862465938), (1.40159992, -14.773073923))
            ThreePointArc((1.40159992, -14.773073923), (0.815813482, -16.187287486), (-0.59840008, -16.773073923))
            Line((-0.59840008, -16.773073923), (-6.59840008, -16.773073923))
            ThreePointArc((-6.59840008, -16.773073923), (-8.012613643, -16.187287486), (-8.59840008, -14.773073923))
            Line((-8.59840008, -14.773073923), (-8.59840008, -4.862465938))
            ThreePointArc((-8.59840008, -4.862465938), (-8.012613643, -3.448252375), (-6.59840008, -2.862465938))
        make_face()
    extrude(amount=-CORTE_EXTRUS_O4_DEPTH, mode=Mode.SUBTRACT)

    # Filete2
    filete2_edges = [part.edges().sort_by_distance(p)[0] for p in [
        (-3, 2.101926077, 60.59840008),
        (-3, 23.09824642, 59.719720424),
        (-3, 23.976926077, 16.09840008),
        (-3, 23.09824642, -27.522920263),
        (-3, 2.101926077, -28.40159992),
        (-3, -18.894394267, -27.522920263),
        (-3, -19.773073923, 16.09840008),
        (-3, -18.894394267, 59.719720424),
    ]]
    fillet(filete2_edges, radius=FILETE2_R)

    # Esboço13 → Corte-extrusão5 (cut)
    with BuildSketch(Plane.ZY.offset(3)):
        with Locations((27.44840008, 3.976926077)):
            Circle(ESBO_O13_R)
        with Locations((4.74840008, 3.976926077)):
            Circle(ESBO_O13_R)
    extrude(amount=-CORTE_EXTRUS_O5_DEPTH, mode=Mode.SUBTRACT)


solid = part.part
